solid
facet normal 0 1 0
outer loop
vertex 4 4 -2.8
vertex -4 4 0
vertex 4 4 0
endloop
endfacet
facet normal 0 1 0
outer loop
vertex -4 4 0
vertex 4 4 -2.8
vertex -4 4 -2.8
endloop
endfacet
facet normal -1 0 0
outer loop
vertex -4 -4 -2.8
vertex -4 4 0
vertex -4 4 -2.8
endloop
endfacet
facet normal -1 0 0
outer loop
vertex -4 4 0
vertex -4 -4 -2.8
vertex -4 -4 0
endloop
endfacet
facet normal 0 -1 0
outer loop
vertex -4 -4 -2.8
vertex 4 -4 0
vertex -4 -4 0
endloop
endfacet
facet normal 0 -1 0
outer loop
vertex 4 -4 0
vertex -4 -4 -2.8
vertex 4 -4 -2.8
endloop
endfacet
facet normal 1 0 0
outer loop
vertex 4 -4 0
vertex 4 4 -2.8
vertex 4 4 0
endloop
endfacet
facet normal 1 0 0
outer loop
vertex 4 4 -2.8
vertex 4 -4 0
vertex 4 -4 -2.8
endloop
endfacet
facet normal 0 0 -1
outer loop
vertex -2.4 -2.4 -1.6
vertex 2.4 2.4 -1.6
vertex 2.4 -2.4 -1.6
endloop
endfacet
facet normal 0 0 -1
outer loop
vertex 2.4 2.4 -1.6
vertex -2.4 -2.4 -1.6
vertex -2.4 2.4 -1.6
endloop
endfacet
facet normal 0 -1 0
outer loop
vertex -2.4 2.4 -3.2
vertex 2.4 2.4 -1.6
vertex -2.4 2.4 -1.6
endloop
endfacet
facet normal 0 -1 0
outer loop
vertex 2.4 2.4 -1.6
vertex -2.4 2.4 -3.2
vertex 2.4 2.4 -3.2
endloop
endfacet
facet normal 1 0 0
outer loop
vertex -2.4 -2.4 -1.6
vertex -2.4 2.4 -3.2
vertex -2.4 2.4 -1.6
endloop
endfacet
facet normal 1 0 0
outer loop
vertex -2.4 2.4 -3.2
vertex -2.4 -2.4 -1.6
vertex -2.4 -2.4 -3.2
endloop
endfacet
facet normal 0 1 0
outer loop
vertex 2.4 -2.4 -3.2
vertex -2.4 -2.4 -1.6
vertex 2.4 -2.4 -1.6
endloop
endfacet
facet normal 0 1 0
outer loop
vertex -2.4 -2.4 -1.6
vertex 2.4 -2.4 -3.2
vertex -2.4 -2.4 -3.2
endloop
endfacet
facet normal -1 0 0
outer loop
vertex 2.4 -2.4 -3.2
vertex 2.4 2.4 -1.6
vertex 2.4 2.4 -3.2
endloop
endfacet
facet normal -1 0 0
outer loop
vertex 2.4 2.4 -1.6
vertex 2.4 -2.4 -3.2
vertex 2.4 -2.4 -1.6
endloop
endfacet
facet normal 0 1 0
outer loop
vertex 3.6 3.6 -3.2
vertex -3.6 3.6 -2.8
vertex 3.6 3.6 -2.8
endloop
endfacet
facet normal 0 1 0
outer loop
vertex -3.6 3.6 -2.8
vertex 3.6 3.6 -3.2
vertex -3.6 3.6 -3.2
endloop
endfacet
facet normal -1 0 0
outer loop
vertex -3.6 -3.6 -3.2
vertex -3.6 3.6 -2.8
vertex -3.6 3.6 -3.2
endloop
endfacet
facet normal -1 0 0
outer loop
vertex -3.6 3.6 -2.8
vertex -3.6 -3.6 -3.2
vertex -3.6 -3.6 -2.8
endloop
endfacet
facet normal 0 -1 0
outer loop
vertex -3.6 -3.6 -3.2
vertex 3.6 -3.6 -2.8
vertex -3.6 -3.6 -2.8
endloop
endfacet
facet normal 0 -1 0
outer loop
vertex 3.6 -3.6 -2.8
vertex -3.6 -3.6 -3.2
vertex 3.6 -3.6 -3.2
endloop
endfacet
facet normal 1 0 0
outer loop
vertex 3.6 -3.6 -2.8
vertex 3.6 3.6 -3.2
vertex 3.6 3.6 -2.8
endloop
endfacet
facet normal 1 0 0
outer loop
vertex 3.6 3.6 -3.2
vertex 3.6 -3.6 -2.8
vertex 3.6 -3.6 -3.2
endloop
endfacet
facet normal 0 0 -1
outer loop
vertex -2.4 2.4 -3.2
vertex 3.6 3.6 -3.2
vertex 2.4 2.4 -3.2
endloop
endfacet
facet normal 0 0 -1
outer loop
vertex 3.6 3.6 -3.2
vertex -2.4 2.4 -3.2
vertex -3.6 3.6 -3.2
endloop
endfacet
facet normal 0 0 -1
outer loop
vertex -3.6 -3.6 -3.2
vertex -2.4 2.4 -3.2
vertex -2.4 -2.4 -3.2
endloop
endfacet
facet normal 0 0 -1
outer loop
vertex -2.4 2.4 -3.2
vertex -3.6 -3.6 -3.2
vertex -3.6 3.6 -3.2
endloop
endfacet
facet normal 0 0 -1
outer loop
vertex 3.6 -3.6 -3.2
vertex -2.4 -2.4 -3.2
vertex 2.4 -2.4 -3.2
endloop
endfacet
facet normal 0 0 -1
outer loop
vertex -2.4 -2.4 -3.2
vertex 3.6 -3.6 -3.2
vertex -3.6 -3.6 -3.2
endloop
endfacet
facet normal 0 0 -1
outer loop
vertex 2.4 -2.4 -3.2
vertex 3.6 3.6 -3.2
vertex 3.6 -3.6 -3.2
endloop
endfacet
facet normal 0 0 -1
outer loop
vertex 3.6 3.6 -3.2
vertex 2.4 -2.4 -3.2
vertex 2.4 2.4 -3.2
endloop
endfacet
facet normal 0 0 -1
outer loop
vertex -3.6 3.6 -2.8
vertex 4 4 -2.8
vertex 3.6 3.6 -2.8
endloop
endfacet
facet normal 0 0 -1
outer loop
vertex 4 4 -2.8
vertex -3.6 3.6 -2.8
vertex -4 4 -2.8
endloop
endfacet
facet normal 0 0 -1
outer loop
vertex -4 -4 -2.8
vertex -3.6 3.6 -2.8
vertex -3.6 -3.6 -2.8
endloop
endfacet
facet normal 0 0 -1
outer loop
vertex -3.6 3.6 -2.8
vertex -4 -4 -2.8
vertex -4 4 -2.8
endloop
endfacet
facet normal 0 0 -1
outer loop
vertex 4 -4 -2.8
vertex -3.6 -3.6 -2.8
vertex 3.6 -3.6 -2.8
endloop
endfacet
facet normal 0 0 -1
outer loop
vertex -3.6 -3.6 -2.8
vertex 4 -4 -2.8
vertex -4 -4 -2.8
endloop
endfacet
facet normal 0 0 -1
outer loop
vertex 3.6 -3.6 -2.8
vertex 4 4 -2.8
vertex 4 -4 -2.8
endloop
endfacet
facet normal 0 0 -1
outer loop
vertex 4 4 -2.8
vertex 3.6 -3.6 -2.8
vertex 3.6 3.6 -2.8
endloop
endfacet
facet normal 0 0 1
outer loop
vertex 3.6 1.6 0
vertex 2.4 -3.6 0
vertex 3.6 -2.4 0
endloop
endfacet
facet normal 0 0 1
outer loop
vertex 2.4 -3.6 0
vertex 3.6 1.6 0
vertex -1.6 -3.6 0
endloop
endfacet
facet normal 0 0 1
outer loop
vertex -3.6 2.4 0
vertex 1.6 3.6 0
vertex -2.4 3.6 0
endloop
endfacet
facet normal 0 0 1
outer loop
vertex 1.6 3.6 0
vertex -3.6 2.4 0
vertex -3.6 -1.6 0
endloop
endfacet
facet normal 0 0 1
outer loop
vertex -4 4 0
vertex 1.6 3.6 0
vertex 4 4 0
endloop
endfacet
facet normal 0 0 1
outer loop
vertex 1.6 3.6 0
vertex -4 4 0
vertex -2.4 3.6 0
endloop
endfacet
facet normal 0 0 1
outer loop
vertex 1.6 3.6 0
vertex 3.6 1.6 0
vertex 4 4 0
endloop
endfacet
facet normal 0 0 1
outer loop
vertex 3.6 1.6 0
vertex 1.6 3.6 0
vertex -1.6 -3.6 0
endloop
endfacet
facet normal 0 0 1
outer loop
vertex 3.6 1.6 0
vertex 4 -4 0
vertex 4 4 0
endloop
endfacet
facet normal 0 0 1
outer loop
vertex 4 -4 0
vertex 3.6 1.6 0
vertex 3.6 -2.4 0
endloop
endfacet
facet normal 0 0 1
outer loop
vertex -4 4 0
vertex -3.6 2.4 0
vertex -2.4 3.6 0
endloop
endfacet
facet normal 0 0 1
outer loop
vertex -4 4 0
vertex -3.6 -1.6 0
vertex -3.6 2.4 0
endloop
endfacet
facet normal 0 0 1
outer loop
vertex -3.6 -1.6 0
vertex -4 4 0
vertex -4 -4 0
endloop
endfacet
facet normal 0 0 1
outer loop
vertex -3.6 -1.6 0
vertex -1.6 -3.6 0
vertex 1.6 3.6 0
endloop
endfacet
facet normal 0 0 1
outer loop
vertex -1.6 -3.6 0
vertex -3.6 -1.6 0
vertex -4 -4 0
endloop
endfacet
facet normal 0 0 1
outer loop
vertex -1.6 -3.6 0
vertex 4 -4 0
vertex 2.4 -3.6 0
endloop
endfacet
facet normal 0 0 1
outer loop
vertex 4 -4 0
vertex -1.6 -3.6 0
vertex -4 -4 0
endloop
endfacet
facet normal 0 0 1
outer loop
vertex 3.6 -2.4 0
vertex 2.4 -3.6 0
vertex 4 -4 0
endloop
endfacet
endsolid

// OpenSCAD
// file: ../p/box5.scad
use <../lib.scad>
function ldraw_lib__box5() = [
// 0 Box with 5 Faces and All Edges
// 0 Name: box5.dat
// 0 Author: James Jessiman
// 0 !LDRAW_ORG Primitive UPDATE 2012-01
// 0 !LICENSE Licensed under CC BY 4.0 : see CAreadme.txt
// 
// 0 BFC CERTIFY CCW
  [0,"BFC","CERTIFY"],
  [0,"BFC","CCW"],
// 
// 0 !HISTORY 2002-04-03 [sbliss] Modified for BFC compliance
// 0 !HISTORY 2002-04-25 [PTadmin] Official Update 2002-02
// 0 !HISTORY 2007-06-24 [PTadmin] Header formatted for Contributor Agreement
// 0 !HISTORY 2008-07-01 [PTadmin] Official Update 2008-01
// 0 !HISTORY 2012-02-16 [Philo] Changed to CCW
// 0 !HISTORY 2012-03-30 [PTadmin] Official Update 2012-01
// 
// 
// 2 24 1 1 1 -1 1 1
  [2,24,1,1,1,-1,1,1],
// 2 24 -1 1 1 -1 1 -1
  [2,24,-1,1,1,-1,1,-1],
// 2 24 -1 1 -1 1 1 -1
  [2,24,-1,1,-1,1,1,-1],
// 2 24 1 1 -1 1 1 1
  [2,24,1,1,-1,1,1,1],
// 2 24 1 0 1 -1 0 1
  [2,24,1,0,1,-1,0,1],
// 2 24 -1 0 1 -1 0 -1
  [2,24,-1,0,1,-1,0,-1],
// 2 24 -1 0 -1 1 0 -1
  [2,24,-1,0,-1,1,0,-1],
// 2 24 1 0 -1 1 0 1
  [2,24,1,0,-1,1,0,1],
// 2 24 1 0 1 1 1 1
  [2,24,1,0,1,1,1,1],
// 2 24 -1 0 1 -1 1 1
  [2,24,-1,0,1,-1,1,1],
// 2 24 1 0 -1 1 1 -1
  [2,24,1,0,-1,1,1,-1],
// 2 24 -1 0 -1 -1 1 -1
  [2,24,-1,0,-1,-1,1,-1],
// 4 16 -1 1 1 1 1 1 1 1 -1 -1 1 -1
  [4,16,-1,1,1,1,1,1,1,1,-1,-1,1,-1],
// 4 16 -1 1 1 -1 0 1 1 0 1 1 1 1
  [4,16,-1,1,1,-1,0,1,1,0,1,1,1,1],
// 4 16 -1 1 -1 -1 0 -1 -1 0 1 -1 1 1
  [4,16,-1,1,-1,-1,0,-1,-1,0,1,-1,1,1],
// 4 16 1 1 -1 1 0 -1 -1 0 -1 -1 1 -1
  [4,16,1,1,-1,1,0,-1,-1,0,-1,-1,1,-1],
// 4 16 1 1 1 1 0 1 1 0 -1 1 1 -1
  [4,16,1,1,1,1,0,1,1,0,-1,1,1,-1],
];
module ldraw_lib__box5(step=0, col=false, unit=2/5, alt=false, line=0.2, solid=!$preview)
    makepoly(ldraw_lib__box5(), step=step, col=col, unit=unit, alt=alt, line=line, solid=solid);
ldraw_lib__box5(line=0.2);
// file: ../p/box4.scad
use <../lib.scad>
function ldraw_lib__box4() = [
// 0 Box with 4 Faces (2 Parallel Pairs) and All Edges
// 0 Name: box4.dat
// 0 Author: James Jessiman
// 0 !LDRAW_ORG Primitive UPDATE 2012-01
// 0 !LICENSE Licensed under CC BY 4.0 : see CAreadme.txt
// 
// 0 BFC CERTIFY CCW
  [0,"BFC","CERTIFY"],
  [0,"BFC","CCW"],
// 
// 0 !HISTORY 2002-04-03 [sbliss] Modified for BFC compliance
// 0 !HISTORY 2002-04-25 [PTadmin] Official Update 2002-02
// 0 !HISTORY 2007-06-24 [PTadmin] Header formatted for Contributor Agreement
// 0 !HISTORY 2008-07-01 [PTadmin] Official Update 2008-01
// 0 !HISTORY 2012-02-16 [Philo] Changed to CCW
// 0 !HISTORY 2012-03-30 [PTadmin] Official Update 2012-01
// 
// 
// 2 24 1 1 1 -1 1 1
  [2,24,1,1,1,-1,1,1],
// 2 24 -1 1 1 -1 1 -1
  [2,24,-1,1,1,-1,1,-1],
// 2 24 -1 1 -1 1 1 -1
  [2,24,-1,1,-1,1,1,-1],
// 2 24 1 1 -1 1 1 1
  [2,24,1,1,-1,1,1,1],
// 2 24 1 0 1 -1 0 1
  [2,24,1,0,1,-1,0,1],
// 2 24 -1 0 1 -1 0 -1
  [2,24,-1,0,1,-1,0,-1],
// 2 24 -1 0 -1 1 0 -1
  [2,24,-1,0,-1,1,0,-1],
// 2 24 1 0 -1 1 0 1
  [2,24,1,0,-1,1,0,1],
// 2 24 1 0 1 1 1 1
  [2,24,1,0,1,1,1,1],
// 2 24 -1 0 1 -1 1 1
  [2,24,-1,0,1,-1,1,1],
// 2 24 1 0 -1 1 1 -1
  [2,24,1,0,-1,1,1,-1],
// 2 24 -1 0 -1 -1 1 -1
  [2,24,-1,0,-1,-1,1,-1],
// 4 16 -1 1 1 -1 0 1 1 0 1 1 1 1
  [4,16,-1,1,1,-1,0,1,1,0,1,1,1,1],
// 4 16 -1 1 -1 -1 0 -1 -1 0 1 -1 1 1
  [4,16,-1,1,-1,-1,0,-1,-1,0,1,-1,1,1],
// 4 16 1 1 -1 1 0 -1 -1 0 -1 -1 1 -1
  [4,16,1,1,-1,1,0,-1,-1,0,-1,-1,1,-1],
// 4 16 1 1 1 1 0 1 1 0 -1 1 1 -1
  [4,16,1,1,1,1,0,1,1,0,-1,1,1,-1],
];
module ldraw_lib__box4(step=0, col=false, unit=2/5, alt=false, line=0.2, solid=!$preview)
    makepoly(ldraw_lib__box4(), step=step, col=col, unit=unit, alt=alt, line=line, solid=solid);
ldraw_lib__box4(line=0.2);
// file: s/3070bs01.scad
use <../../lib.scad>
use <../../p/box4.scad>
use <../../p/box5.scad>
function ldraw_lib__s__3070bs01() = [
// 0 ~Tile  1 x  1 with Groove without Top Face
// 0 Name: s\3070bs01.dat
// 0 Author: Chris Dee [cwdee]
// 0 !LDRAW_ORG Subpart UPDATE 2009-02
// 0 !LICENSE Licensed under CC BY 4.0 : see CAreadme.txt
// 
// 0 BFC CERTIFY CCW
  [0,"BFC","CERTIFY"],
  [0,"BFC","CCW"],
// 
// 0 !HISTORY 2009-09-03 [PTadmin] Official Update 2009-02
// 
// 
// 1 16 0 0 0 10 0 0 0 7 0 0 0 10 box4.dat
  [1,16,0,0,0,10,0,0,0,7,0,0,0,10, ldraw_lib__box4()],
// 0 BFC INVERTNEXT
  [0,"BFC","INVERTNEXT"],
// 1 16 0 8 0 6 0 0 0 -4 0 0 0 6 box5.dat
  [1,16,0,8,0,6,0,0,0,-4,0,0,0,6, ldraw_lib__box5()],
// 1 16 0 7 0 9 0 0 0 1 0 0 0 9 box4.dat
  [1,16,0,7,0,9,0,0,0,1,0,0,0,9, ldraw_lib__box4()],
// 
// 4 16 9 8 9 6 8 6 -6 8 6 -9 8 9
  [4,16,9,8,9,6,8,6,-6,8,6,-9,8,9],
// 4 16 -9 8 9 -6 8 6 -6 8 -6 -9 8 -9
  [4,16,-9,8,9,-6,8,6,-6,8,-6,-9,8,-9],
// 4 16 -9 8 -9 -6 8 -6 6 8 -6 9 8 -9
  [4,16,-9,8,-9,-6,8,-6,6,8,-6,9,8,-9],
// 4 16 9 8 -9 6 8 -6 6 8 6 9 8 9
  [4,16,9,8,-9,6,8,-6,6,8,6,9,8,9],
// 
// 4 16 10 7 10 9 7 9 -9 7 9 -10 7 10
  [4,16,10,7,10,9,7,9,-9,7,9,-10,7,10],
// 4 16 -10 7 10 -9 7 9 -9 7 -9 -10 7 -10
  [4,16,-10,7,10,-9,7,9,-9,7,-9,-10,7,-10],
// 4 16 -10 7 -10 -9 7 -9 9 7 -9 10 7 -10
  [4,16,-10,7,-10,-9,7,-9,9,7,-9,10,7,-10],
// 4 16 10 7 -10 9 7 -9 9 7 9 10 7 10
  [4,16,10,7,-10,9,7,-9,9,7,9,10,7,10],
// 0
];
module ldraw_lib__s__3070bs01(step=0, col=false, unit=2/5, alt=false, line=0.2, solid=!$preview)
    makepoly(ldraw_lib__s__3070bs01(), step=step, col=col, unit=unit, alt=alt, line=line, solid=solid);
ldraw_lib__s__3070bs01(line=0.2);
// main file
use <../lib.scad>
use <s/3070bs01.scad>
function ldraw_lib__3070bp1p() = [
// 0 Tile  1 x  1 with Danger Red Stripes Pattern
// 0 Name: 3070bp1p.dat
// 0 Author: Philippe Hurbain [Philo]
// 0 !LDRAW_ORG Part UPDATE 2024-06
// 0 !LICENSE Licensed under CC BY 4.0 : see CAreadme.txt
// 
// 0 BFC CERTIFY CCW
  [0,"BFC","CERTIFY"],
  [0,"BFC","CCW"],
// 
// 0 !KEYWORDS Set 60420
// 
// 0 !HISTORY 2024-07-29 [OrionP] Official Update 2024-06
// 
// 1 16 0 0 0 1 0 0 0 1 0 0 0 1 s\3070bs01.dat
  [1,16,0,0,0,1,0,0,0,1,0,0,0,1, ldraw_lib__s__3070bs01()],
// 4 4 6 0 -9 9 0 -6 9 0 4 -4 0 -9
  [4,4,6,0,-9,9,0,-6,9,0,4,-4,0,-9],
// 4 4 -9 0 -4 4 0 9 -6 0 9 -9 0 6
  [4,4,-9,0,-4,4,0,9,-6,0,9,-9,0,6],
// 4 16 -10 0 10 -6 0 9 4 0 9 10 0 10
  [4,16,-10,0,10,-6,0,9,4,0,9,10,0,10],
// 4 16 9 0 4 10 0 10 4 0 9 -4 0 -9
  [4,16,9,0,4,10,0,10,4,0,9,-4,0,-9],
// 4 16 9 0 4 9 0 -6 10 0 -10 10 0 10
  [4,16,9,0,4,9,0,-6,10,0,-10,10,0,10],
// 3 16 -10 0 10 -9 0 6 -6 0 9
  [3,16,-10,0,10,-9,0,6,-6,0,9],
// 4 16 -10 0 10 -10 0 -10 -9 0 -4 -9 0 6
  [4,16,-10,0,10,-10,0,-10,-9,0,-4,-9,0,6],
// 4 16 -9 0 -4 -10 0 -10 -4 0 -9 4 0 9
  [4,16,-9,0,-4,-10,0,-10,-4,0,-9,4,0,9],
// 4 16 -4 0 -9 -10 0 -10 10 0 -10 6 0 -9
  [4,16,-4,0,-9,-10,0,-10,10,0,-10,6,0,-9],
// 3 16 9 0 -6 6 0 -9 10 0 -10
  [3,16,9,0,-6,6,0,-9,10,0,-10],
];
module ldraw_lib__3070bp1p(step=0, col=false, unit=2/5, alt=false, line=0.2, solid=!$preview)
    makepoly(ldraw_lib__3070bp1p(), step=step, col=col, unit=unit, alt=alt, line=line, solid=solid);
ldraw_lib__3070bp1p(line=0.2);
